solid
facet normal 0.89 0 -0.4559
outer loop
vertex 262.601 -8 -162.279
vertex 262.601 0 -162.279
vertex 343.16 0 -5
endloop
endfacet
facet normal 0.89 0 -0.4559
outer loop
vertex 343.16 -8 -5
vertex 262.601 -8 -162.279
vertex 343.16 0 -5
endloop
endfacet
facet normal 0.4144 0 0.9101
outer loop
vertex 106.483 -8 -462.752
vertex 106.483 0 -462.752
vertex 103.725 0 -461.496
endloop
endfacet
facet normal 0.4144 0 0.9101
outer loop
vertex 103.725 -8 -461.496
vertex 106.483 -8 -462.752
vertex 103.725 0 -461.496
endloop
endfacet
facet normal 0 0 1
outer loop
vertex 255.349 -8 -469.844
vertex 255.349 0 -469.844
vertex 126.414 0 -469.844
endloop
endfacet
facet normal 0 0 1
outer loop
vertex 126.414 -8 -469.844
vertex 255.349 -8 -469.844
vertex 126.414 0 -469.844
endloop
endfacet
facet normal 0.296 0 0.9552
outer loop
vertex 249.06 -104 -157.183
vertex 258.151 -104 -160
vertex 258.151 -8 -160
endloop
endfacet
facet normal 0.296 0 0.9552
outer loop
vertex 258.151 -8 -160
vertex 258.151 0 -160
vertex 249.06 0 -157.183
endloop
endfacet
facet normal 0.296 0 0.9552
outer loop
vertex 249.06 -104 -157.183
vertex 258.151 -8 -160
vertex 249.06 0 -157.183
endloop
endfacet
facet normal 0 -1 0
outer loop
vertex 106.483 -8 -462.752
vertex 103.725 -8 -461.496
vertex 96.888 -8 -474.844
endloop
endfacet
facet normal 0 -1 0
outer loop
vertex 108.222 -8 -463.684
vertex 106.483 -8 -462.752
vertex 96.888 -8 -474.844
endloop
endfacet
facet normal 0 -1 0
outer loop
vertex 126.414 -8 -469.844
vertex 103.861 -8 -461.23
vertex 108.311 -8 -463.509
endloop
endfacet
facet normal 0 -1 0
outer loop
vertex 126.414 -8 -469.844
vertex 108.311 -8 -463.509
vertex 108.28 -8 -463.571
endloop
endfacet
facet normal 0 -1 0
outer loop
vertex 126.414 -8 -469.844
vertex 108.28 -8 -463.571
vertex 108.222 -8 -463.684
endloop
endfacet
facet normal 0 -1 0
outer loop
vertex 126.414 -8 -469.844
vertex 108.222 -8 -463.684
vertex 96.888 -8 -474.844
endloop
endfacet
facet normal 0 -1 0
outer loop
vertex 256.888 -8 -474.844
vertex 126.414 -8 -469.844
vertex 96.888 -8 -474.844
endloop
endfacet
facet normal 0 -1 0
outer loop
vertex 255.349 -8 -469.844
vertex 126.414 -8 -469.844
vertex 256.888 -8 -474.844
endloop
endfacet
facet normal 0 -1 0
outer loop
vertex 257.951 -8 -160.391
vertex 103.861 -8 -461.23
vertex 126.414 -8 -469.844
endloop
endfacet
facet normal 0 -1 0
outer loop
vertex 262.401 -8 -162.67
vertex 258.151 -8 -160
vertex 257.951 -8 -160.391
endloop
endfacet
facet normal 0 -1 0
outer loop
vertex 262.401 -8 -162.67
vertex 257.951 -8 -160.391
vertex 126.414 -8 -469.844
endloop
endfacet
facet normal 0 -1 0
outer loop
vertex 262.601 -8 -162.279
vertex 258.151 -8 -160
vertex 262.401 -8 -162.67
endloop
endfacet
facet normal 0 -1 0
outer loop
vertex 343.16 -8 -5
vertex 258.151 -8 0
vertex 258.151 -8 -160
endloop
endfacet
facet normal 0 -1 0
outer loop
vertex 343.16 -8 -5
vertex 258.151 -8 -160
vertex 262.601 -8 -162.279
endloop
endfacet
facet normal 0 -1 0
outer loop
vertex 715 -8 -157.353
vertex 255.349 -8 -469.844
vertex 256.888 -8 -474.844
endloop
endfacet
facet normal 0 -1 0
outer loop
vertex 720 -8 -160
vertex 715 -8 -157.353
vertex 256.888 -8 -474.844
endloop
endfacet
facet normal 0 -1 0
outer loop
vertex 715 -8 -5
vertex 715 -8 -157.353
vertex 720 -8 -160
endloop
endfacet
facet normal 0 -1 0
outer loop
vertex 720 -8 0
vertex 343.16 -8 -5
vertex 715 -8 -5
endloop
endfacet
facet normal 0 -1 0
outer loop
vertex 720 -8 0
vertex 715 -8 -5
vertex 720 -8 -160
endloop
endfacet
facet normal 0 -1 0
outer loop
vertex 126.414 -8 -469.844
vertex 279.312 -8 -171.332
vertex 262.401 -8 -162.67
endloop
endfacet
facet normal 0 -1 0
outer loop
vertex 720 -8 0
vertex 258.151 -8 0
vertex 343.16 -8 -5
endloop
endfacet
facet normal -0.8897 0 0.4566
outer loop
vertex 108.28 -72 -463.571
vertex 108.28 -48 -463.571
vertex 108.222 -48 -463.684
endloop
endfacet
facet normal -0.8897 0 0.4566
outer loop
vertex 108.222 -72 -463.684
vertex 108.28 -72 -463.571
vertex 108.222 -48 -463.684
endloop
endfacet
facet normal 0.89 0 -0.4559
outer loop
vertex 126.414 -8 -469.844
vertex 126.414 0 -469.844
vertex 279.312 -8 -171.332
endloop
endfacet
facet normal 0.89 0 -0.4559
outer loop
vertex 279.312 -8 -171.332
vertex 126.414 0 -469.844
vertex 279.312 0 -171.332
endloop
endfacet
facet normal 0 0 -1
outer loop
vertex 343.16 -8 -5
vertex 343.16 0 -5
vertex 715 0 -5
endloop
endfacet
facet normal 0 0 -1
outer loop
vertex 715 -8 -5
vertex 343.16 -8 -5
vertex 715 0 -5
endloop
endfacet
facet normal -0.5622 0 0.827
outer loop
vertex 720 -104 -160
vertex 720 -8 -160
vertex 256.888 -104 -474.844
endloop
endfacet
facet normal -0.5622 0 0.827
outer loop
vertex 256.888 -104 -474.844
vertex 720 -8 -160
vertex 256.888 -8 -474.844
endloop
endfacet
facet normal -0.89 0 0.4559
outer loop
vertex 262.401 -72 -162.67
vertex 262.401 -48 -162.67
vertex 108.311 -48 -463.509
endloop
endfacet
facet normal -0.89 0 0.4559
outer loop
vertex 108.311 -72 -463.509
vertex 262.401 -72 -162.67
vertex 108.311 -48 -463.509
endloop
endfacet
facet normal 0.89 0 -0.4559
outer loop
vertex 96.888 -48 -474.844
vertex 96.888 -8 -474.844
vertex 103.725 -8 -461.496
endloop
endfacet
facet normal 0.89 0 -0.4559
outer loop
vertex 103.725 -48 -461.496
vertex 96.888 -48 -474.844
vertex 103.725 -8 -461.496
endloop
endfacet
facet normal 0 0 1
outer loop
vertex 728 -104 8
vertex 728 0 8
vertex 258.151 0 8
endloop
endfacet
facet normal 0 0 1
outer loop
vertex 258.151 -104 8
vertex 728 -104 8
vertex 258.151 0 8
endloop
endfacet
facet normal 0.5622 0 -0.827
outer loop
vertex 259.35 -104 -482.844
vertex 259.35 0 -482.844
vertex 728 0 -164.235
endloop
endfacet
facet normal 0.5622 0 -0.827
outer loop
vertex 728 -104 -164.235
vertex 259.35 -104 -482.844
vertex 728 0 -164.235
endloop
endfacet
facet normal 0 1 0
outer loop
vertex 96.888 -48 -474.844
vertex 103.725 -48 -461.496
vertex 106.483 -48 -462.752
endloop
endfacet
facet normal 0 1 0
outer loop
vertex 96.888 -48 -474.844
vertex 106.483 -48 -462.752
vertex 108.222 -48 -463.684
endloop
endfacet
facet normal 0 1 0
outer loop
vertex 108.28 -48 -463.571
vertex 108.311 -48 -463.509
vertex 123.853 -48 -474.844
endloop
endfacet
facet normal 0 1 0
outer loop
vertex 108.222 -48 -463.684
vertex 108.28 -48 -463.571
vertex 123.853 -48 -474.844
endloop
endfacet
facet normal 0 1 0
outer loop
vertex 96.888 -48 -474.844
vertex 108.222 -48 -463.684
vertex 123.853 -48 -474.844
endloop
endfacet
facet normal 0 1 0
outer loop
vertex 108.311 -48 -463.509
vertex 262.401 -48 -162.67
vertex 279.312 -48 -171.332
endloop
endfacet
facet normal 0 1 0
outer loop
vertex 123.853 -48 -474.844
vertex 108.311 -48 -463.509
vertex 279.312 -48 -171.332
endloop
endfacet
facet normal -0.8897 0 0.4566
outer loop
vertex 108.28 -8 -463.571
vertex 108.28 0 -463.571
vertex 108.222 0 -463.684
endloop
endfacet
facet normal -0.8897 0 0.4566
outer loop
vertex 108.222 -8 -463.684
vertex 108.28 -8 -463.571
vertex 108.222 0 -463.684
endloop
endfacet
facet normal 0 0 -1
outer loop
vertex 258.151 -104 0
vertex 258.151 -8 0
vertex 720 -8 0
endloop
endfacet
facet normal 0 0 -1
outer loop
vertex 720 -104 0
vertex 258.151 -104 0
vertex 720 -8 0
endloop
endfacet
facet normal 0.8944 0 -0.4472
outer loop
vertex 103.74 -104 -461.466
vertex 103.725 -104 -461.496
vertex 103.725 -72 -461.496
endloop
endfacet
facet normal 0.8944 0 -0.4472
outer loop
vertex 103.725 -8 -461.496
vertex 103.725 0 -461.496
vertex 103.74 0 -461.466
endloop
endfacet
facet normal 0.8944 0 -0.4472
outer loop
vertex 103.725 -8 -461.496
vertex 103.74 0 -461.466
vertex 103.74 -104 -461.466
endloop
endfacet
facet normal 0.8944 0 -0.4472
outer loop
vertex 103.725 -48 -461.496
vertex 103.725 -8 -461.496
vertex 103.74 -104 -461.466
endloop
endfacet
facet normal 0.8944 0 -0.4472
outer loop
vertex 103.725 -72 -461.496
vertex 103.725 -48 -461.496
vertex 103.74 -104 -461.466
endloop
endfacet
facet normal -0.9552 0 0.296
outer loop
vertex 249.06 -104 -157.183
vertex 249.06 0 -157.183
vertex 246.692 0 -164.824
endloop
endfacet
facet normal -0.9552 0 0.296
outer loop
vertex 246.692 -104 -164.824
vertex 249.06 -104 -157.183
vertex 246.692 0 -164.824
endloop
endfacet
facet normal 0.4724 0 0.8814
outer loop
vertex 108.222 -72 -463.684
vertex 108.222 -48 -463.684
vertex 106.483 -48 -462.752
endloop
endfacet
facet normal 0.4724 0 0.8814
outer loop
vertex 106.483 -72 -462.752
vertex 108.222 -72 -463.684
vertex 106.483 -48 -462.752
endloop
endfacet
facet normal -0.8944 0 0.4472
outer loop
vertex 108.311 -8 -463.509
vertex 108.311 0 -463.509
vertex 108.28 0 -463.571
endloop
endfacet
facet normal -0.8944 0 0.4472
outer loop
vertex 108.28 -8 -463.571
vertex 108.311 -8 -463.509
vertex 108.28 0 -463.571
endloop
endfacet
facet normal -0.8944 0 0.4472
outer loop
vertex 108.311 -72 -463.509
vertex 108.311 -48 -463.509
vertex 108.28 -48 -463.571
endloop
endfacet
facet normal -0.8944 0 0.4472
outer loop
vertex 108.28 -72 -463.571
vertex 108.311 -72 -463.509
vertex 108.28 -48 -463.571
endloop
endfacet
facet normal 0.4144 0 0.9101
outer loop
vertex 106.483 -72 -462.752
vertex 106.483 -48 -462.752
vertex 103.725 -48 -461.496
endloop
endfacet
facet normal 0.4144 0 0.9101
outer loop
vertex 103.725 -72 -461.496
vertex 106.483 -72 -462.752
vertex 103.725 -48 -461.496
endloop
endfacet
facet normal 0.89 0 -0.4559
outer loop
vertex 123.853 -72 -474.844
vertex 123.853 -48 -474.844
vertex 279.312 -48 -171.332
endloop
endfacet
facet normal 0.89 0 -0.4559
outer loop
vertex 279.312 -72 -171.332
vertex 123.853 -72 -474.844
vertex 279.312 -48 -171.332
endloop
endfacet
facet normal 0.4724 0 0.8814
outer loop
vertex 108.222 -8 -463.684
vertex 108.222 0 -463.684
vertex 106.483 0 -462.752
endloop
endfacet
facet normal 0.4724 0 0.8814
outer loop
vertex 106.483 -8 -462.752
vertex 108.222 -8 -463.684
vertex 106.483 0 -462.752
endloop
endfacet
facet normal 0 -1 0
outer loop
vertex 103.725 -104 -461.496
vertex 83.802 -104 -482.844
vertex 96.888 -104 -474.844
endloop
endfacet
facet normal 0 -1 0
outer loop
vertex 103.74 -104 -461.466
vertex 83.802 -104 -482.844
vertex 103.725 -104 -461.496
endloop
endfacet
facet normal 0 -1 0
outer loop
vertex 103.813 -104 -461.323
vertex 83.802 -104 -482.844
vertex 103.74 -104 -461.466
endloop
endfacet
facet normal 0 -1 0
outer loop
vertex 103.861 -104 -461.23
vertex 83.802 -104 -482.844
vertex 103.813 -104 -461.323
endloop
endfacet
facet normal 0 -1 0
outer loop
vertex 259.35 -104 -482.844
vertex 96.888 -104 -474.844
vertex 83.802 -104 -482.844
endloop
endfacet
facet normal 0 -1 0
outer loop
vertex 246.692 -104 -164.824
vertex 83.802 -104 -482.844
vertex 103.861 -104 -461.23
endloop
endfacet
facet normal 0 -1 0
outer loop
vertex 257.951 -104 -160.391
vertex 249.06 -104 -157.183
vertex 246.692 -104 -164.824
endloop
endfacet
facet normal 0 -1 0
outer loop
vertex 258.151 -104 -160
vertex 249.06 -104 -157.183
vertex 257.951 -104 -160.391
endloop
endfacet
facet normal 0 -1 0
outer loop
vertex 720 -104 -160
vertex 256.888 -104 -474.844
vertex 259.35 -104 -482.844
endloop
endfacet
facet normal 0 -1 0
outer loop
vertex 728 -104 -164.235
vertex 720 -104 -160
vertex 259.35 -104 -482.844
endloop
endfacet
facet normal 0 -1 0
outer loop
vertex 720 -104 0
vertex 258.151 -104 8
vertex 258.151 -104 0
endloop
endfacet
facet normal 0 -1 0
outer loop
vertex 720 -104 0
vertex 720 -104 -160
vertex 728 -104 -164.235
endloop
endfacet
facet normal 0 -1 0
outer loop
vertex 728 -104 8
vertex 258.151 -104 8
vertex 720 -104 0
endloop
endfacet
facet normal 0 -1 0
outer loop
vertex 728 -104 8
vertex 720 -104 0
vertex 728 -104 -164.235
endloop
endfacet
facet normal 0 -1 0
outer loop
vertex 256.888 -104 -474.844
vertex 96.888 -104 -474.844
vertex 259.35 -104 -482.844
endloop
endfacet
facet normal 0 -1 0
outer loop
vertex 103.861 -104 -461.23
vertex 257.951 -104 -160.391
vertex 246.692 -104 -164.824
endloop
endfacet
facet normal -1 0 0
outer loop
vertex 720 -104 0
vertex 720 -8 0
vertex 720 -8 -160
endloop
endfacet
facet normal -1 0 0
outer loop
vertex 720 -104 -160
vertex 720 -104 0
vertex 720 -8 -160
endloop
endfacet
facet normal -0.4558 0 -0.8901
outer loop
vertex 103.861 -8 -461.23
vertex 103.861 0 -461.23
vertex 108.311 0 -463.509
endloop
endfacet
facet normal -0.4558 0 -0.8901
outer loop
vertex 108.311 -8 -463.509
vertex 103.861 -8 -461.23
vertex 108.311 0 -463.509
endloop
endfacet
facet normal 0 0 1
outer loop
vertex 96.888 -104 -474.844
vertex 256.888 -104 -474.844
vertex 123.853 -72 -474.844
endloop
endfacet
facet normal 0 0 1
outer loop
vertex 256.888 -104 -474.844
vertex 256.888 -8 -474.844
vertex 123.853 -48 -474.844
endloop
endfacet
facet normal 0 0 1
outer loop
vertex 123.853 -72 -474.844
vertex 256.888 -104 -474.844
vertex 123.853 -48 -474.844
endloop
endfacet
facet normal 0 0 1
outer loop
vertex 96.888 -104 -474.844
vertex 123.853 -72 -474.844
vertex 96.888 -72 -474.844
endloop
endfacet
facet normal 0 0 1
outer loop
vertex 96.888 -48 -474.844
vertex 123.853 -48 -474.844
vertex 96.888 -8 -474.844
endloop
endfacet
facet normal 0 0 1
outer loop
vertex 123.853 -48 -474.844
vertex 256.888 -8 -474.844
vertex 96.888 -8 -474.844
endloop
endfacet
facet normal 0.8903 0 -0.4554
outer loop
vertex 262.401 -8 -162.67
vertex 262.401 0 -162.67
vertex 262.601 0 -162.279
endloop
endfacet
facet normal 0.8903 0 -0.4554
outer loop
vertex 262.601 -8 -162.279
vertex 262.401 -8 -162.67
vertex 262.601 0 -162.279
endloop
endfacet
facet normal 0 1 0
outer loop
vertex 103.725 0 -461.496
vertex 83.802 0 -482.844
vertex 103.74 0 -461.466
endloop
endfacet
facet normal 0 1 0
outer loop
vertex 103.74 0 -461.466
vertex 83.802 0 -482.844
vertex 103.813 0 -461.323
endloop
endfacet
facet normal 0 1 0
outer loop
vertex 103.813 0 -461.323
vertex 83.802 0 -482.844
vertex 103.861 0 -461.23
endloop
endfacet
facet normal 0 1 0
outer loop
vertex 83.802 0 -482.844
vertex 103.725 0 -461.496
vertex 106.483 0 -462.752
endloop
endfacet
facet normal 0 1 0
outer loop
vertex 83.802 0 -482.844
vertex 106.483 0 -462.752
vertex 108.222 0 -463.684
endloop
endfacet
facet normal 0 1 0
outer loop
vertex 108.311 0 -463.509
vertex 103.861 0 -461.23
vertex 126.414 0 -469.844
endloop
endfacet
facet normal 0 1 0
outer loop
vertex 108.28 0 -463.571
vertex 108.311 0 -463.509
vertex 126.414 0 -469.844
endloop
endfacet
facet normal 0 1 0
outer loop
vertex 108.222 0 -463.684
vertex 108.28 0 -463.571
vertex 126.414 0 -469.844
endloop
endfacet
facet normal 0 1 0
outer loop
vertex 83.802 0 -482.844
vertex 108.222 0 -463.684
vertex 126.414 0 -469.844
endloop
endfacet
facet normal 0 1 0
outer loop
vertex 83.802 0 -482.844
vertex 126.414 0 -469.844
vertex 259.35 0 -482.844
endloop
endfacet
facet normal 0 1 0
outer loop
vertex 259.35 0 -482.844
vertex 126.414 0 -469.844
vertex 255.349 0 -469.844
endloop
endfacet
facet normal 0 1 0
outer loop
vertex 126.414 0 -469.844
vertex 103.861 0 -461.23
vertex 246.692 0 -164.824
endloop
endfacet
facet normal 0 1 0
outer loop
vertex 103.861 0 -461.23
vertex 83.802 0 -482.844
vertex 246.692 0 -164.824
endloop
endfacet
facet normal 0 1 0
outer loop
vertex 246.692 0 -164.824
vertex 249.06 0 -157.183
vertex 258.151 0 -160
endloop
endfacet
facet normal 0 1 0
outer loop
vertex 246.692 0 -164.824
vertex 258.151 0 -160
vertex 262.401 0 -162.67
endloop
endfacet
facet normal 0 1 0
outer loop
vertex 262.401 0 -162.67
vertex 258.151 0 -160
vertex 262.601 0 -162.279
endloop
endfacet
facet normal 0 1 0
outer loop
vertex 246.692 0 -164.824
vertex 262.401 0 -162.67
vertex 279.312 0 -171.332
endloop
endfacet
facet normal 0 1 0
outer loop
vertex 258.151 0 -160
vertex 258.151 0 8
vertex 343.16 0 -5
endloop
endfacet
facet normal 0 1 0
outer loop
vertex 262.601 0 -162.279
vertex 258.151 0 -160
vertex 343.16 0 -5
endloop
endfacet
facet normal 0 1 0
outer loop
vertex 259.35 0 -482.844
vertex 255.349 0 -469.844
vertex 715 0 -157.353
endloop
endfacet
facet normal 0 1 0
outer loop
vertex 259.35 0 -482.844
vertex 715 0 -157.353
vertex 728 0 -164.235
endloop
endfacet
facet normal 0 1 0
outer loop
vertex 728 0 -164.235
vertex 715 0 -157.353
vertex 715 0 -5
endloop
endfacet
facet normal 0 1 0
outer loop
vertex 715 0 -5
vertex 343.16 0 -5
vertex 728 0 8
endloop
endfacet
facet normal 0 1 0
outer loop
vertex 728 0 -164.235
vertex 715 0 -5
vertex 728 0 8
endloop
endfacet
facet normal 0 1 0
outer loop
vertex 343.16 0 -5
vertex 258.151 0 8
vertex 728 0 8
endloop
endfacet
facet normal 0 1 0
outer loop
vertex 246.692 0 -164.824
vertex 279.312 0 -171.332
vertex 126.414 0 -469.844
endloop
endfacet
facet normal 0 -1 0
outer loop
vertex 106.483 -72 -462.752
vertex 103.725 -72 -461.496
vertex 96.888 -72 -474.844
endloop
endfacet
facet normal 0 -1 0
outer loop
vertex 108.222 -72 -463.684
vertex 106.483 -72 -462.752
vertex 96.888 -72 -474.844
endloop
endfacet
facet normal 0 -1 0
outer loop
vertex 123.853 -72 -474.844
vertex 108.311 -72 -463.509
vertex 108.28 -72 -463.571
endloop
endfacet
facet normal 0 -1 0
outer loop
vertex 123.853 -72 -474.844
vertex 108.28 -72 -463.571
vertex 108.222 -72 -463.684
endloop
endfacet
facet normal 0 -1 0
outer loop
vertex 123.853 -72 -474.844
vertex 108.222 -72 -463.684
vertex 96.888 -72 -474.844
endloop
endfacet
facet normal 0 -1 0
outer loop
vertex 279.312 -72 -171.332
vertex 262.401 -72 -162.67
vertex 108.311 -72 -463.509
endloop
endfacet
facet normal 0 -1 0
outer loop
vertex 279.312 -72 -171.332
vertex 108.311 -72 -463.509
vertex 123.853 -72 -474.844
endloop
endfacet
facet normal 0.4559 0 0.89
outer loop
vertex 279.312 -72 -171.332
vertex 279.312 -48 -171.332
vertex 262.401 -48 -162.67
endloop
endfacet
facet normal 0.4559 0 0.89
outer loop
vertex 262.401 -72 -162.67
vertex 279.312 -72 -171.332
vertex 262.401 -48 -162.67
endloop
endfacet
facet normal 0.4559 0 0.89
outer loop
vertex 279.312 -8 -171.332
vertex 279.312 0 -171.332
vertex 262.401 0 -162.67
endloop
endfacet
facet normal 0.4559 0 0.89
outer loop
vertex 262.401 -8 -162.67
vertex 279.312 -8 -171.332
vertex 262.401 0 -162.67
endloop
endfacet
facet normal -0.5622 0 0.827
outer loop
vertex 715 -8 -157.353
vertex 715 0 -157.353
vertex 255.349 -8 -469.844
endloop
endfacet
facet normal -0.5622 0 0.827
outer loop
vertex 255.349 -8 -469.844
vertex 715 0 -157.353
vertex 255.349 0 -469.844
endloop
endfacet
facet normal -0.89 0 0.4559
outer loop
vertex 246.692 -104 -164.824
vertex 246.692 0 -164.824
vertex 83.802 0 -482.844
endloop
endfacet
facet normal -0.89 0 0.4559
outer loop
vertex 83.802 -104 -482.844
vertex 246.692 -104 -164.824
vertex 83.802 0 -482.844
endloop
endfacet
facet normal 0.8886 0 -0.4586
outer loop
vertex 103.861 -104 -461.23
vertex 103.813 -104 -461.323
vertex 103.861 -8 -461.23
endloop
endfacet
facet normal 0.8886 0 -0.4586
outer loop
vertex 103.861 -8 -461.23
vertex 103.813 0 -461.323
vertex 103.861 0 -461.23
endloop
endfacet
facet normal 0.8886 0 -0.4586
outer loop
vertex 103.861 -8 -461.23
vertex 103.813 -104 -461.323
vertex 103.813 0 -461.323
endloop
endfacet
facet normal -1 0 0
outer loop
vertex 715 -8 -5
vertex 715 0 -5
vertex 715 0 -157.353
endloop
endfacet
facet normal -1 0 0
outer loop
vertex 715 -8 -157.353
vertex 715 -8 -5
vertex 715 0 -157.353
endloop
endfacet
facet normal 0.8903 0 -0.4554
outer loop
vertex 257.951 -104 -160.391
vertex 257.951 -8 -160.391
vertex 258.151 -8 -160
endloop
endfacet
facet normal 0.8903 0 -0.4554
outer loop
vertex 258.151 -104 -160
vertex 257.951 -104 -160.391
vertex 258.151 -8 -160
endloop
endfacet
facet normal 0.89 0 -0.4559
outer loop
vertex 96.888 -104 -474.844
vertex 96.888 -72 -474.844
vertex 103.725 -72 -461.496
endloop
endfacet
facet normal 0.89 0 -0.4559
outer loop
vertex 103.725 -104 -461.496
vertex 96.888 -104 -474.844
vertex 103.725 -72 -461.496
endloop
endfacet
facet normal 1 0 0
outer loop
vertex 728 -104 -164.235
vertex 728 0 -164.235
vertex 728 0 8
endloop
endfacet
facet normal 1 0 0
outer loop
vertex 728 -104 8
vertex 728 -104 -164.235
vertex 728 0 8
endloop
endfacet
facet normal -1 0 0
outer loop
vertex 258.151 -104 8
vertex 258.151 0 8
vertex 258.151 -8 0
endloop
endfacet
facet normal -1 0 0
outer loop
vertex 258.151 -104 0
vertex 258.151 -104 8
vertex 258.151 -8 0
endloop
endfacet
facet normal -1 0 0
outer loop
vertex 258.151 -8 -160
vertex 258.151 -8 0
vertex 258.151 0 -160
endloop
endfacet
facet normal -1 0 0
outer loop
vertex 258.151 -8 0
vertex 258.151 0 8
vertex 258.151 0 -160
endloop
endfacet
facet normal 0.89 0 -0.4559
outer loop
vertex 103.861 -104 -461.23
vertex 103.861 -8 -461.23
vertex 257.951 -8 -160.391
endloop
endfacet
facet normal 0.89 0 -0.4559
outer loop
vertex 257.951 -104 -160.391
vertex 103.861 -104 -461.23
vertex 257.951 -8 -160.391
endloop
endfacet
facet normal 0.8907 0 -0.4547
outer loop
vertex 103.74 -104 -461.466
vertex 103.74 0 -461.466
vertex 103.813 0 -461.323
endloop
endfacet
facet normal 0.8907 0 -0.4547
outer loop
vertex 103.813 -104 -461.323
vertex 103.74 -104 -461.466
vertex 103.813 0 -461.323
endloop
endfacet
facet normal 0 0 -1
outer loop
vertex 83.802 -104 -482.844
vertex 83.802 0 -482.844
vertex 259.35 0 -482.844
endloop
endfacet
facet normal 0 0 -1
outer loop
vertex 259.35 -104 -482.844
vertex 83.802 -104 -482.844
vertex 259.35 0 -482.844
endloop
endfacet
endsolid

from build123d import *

# Parameters (mm, degrees)
F6_DEPTH = 8
F7_DEPTH = 104
F8_START = 48
F8_DEPTH = 24


with BuildPart() as f6:
    # F5 (on Front) → F6 (new body)
    with BuildSketch(Plane.XZ):
        Polygon((258.1512545863, 8), (258.1512545863, 0), (720, 0), (720, -160), (256.8877548805, -474.8444829124), (123.8527919354, -474.8444829124), (96.8877548805, -474.8444829124), (103.7249146428, -461.4958824301), (103.7400223735, -461.4663866938), (103.8133779806, -461.3231701059), (103.8610917427, -461.2300156427), (257.951143964, -160.3906880696), (258.1512545863, -160), (249.0600389619, -157.1826700935), (246.6919749543, -164.824153775), (83.8018052429, -482.8444829124), (259.3496117054, -482.8444829124), (728, -164.234921787), (728, 8), align=None)
        Polygon((720, 0), (258.1512545863, 0), (258.1512545863, -160), (262.6014617103, -162.2793982877), (343.1600472217, -5), (715, -5), (715, -157.3531738831), (255.3490943649, -469.8444829124), (126.4137944058, -469.8444829124), (123.8527919354, -474.8444829124), (256.8877548805, -474.8444829124), (720, -160), align=None)
        Polygon((96.8877548805, -474.8444829124), (123.8527919354, -474.8444829124), (126.4137944058, -469.8444829124), (105.066473404, -469.8444829124), (108.2219495636, -463.6838559781), (106.4825408482, -462.7524437274), (103.7249146428, -461.4958824301), align=None)
        Polygon((279.3121381591, -171.3317998503), (262.401351088, -162.6700863573), (108.3112988667, -463.5094139303), (108.2795983128, -463.5713048387), (108.2219495636, -463.6838559781), (105.066473404, -469.8444829124), (126.4137944058, -469.8444829124), align=None)
        Polygon((262.6014617103, -162.2793982877), (258.1512545863, -160), (257.951143964, -160.3906880696), (262.401351088, -162.6700863573), align=None)
        Polygon((262.401351088, -162.6700863573), (257.951143964, -160.3906880696), (103.8610917427, -461.2300156427), (108.3112988667, -463.5094139303), align=None)
    extrude(amount=F6_DEPTH)

    # F5 (on Front) → F7 (join)
    with BuildSketch(Plane.XZ):
        Polygon((258.1512545863, 8), (258.1512545863, 0), (720, 0), (720, -160), (256.8877548805, -474.8444829124), (123.8527919354, -474.8444829124), (96.8877548805, -474.8444829124), (103.7249146428, -461.4958824301), (103.7400223735, -461.4663866938), (103.8133779806, -461.3231701059), (103.8610917427, -461.2300156427), (257.951143964, -160.3906880696), (258.1512545863, -160), (249.0600389619, -157.1826700935), (246.6919749543, -164.824153775), (83.8018052429, -482.8444829124), (259.3496117054, -482.8444829124), (728, -164.234921787), (728, 8), align=None)
    extrude(amount=F7_DEPTH)

    # F5 (on Front) → F8 (join)
    with BuildSketch(Plane.XZ.offset(F8_START)):
        Polygon((96.8877548805, -474.8444829124), (123.8527919354, -474.8444829124), (126.4137944058, -469.8444829124), (105.066473404, -469.8444829124), (108.2219495636, -463.6838559781), (106.4825408482, -462.7524437274), (103.7249146428, -461.4958824301), align=None)
        Polygon((279.3121381591, -171.3317998503), (262.401351088, -162.6700863573), (108.3112988667, -463.5094139303), (108.2795983128, -463.5713048387), (108.2219495636, -463.6838559781), (105.066473404, -469.8444829124), (126.4137944058, -469.8444829124), align=None)
    extrude(amount=F8_DEPTH)


solid = f6.part
